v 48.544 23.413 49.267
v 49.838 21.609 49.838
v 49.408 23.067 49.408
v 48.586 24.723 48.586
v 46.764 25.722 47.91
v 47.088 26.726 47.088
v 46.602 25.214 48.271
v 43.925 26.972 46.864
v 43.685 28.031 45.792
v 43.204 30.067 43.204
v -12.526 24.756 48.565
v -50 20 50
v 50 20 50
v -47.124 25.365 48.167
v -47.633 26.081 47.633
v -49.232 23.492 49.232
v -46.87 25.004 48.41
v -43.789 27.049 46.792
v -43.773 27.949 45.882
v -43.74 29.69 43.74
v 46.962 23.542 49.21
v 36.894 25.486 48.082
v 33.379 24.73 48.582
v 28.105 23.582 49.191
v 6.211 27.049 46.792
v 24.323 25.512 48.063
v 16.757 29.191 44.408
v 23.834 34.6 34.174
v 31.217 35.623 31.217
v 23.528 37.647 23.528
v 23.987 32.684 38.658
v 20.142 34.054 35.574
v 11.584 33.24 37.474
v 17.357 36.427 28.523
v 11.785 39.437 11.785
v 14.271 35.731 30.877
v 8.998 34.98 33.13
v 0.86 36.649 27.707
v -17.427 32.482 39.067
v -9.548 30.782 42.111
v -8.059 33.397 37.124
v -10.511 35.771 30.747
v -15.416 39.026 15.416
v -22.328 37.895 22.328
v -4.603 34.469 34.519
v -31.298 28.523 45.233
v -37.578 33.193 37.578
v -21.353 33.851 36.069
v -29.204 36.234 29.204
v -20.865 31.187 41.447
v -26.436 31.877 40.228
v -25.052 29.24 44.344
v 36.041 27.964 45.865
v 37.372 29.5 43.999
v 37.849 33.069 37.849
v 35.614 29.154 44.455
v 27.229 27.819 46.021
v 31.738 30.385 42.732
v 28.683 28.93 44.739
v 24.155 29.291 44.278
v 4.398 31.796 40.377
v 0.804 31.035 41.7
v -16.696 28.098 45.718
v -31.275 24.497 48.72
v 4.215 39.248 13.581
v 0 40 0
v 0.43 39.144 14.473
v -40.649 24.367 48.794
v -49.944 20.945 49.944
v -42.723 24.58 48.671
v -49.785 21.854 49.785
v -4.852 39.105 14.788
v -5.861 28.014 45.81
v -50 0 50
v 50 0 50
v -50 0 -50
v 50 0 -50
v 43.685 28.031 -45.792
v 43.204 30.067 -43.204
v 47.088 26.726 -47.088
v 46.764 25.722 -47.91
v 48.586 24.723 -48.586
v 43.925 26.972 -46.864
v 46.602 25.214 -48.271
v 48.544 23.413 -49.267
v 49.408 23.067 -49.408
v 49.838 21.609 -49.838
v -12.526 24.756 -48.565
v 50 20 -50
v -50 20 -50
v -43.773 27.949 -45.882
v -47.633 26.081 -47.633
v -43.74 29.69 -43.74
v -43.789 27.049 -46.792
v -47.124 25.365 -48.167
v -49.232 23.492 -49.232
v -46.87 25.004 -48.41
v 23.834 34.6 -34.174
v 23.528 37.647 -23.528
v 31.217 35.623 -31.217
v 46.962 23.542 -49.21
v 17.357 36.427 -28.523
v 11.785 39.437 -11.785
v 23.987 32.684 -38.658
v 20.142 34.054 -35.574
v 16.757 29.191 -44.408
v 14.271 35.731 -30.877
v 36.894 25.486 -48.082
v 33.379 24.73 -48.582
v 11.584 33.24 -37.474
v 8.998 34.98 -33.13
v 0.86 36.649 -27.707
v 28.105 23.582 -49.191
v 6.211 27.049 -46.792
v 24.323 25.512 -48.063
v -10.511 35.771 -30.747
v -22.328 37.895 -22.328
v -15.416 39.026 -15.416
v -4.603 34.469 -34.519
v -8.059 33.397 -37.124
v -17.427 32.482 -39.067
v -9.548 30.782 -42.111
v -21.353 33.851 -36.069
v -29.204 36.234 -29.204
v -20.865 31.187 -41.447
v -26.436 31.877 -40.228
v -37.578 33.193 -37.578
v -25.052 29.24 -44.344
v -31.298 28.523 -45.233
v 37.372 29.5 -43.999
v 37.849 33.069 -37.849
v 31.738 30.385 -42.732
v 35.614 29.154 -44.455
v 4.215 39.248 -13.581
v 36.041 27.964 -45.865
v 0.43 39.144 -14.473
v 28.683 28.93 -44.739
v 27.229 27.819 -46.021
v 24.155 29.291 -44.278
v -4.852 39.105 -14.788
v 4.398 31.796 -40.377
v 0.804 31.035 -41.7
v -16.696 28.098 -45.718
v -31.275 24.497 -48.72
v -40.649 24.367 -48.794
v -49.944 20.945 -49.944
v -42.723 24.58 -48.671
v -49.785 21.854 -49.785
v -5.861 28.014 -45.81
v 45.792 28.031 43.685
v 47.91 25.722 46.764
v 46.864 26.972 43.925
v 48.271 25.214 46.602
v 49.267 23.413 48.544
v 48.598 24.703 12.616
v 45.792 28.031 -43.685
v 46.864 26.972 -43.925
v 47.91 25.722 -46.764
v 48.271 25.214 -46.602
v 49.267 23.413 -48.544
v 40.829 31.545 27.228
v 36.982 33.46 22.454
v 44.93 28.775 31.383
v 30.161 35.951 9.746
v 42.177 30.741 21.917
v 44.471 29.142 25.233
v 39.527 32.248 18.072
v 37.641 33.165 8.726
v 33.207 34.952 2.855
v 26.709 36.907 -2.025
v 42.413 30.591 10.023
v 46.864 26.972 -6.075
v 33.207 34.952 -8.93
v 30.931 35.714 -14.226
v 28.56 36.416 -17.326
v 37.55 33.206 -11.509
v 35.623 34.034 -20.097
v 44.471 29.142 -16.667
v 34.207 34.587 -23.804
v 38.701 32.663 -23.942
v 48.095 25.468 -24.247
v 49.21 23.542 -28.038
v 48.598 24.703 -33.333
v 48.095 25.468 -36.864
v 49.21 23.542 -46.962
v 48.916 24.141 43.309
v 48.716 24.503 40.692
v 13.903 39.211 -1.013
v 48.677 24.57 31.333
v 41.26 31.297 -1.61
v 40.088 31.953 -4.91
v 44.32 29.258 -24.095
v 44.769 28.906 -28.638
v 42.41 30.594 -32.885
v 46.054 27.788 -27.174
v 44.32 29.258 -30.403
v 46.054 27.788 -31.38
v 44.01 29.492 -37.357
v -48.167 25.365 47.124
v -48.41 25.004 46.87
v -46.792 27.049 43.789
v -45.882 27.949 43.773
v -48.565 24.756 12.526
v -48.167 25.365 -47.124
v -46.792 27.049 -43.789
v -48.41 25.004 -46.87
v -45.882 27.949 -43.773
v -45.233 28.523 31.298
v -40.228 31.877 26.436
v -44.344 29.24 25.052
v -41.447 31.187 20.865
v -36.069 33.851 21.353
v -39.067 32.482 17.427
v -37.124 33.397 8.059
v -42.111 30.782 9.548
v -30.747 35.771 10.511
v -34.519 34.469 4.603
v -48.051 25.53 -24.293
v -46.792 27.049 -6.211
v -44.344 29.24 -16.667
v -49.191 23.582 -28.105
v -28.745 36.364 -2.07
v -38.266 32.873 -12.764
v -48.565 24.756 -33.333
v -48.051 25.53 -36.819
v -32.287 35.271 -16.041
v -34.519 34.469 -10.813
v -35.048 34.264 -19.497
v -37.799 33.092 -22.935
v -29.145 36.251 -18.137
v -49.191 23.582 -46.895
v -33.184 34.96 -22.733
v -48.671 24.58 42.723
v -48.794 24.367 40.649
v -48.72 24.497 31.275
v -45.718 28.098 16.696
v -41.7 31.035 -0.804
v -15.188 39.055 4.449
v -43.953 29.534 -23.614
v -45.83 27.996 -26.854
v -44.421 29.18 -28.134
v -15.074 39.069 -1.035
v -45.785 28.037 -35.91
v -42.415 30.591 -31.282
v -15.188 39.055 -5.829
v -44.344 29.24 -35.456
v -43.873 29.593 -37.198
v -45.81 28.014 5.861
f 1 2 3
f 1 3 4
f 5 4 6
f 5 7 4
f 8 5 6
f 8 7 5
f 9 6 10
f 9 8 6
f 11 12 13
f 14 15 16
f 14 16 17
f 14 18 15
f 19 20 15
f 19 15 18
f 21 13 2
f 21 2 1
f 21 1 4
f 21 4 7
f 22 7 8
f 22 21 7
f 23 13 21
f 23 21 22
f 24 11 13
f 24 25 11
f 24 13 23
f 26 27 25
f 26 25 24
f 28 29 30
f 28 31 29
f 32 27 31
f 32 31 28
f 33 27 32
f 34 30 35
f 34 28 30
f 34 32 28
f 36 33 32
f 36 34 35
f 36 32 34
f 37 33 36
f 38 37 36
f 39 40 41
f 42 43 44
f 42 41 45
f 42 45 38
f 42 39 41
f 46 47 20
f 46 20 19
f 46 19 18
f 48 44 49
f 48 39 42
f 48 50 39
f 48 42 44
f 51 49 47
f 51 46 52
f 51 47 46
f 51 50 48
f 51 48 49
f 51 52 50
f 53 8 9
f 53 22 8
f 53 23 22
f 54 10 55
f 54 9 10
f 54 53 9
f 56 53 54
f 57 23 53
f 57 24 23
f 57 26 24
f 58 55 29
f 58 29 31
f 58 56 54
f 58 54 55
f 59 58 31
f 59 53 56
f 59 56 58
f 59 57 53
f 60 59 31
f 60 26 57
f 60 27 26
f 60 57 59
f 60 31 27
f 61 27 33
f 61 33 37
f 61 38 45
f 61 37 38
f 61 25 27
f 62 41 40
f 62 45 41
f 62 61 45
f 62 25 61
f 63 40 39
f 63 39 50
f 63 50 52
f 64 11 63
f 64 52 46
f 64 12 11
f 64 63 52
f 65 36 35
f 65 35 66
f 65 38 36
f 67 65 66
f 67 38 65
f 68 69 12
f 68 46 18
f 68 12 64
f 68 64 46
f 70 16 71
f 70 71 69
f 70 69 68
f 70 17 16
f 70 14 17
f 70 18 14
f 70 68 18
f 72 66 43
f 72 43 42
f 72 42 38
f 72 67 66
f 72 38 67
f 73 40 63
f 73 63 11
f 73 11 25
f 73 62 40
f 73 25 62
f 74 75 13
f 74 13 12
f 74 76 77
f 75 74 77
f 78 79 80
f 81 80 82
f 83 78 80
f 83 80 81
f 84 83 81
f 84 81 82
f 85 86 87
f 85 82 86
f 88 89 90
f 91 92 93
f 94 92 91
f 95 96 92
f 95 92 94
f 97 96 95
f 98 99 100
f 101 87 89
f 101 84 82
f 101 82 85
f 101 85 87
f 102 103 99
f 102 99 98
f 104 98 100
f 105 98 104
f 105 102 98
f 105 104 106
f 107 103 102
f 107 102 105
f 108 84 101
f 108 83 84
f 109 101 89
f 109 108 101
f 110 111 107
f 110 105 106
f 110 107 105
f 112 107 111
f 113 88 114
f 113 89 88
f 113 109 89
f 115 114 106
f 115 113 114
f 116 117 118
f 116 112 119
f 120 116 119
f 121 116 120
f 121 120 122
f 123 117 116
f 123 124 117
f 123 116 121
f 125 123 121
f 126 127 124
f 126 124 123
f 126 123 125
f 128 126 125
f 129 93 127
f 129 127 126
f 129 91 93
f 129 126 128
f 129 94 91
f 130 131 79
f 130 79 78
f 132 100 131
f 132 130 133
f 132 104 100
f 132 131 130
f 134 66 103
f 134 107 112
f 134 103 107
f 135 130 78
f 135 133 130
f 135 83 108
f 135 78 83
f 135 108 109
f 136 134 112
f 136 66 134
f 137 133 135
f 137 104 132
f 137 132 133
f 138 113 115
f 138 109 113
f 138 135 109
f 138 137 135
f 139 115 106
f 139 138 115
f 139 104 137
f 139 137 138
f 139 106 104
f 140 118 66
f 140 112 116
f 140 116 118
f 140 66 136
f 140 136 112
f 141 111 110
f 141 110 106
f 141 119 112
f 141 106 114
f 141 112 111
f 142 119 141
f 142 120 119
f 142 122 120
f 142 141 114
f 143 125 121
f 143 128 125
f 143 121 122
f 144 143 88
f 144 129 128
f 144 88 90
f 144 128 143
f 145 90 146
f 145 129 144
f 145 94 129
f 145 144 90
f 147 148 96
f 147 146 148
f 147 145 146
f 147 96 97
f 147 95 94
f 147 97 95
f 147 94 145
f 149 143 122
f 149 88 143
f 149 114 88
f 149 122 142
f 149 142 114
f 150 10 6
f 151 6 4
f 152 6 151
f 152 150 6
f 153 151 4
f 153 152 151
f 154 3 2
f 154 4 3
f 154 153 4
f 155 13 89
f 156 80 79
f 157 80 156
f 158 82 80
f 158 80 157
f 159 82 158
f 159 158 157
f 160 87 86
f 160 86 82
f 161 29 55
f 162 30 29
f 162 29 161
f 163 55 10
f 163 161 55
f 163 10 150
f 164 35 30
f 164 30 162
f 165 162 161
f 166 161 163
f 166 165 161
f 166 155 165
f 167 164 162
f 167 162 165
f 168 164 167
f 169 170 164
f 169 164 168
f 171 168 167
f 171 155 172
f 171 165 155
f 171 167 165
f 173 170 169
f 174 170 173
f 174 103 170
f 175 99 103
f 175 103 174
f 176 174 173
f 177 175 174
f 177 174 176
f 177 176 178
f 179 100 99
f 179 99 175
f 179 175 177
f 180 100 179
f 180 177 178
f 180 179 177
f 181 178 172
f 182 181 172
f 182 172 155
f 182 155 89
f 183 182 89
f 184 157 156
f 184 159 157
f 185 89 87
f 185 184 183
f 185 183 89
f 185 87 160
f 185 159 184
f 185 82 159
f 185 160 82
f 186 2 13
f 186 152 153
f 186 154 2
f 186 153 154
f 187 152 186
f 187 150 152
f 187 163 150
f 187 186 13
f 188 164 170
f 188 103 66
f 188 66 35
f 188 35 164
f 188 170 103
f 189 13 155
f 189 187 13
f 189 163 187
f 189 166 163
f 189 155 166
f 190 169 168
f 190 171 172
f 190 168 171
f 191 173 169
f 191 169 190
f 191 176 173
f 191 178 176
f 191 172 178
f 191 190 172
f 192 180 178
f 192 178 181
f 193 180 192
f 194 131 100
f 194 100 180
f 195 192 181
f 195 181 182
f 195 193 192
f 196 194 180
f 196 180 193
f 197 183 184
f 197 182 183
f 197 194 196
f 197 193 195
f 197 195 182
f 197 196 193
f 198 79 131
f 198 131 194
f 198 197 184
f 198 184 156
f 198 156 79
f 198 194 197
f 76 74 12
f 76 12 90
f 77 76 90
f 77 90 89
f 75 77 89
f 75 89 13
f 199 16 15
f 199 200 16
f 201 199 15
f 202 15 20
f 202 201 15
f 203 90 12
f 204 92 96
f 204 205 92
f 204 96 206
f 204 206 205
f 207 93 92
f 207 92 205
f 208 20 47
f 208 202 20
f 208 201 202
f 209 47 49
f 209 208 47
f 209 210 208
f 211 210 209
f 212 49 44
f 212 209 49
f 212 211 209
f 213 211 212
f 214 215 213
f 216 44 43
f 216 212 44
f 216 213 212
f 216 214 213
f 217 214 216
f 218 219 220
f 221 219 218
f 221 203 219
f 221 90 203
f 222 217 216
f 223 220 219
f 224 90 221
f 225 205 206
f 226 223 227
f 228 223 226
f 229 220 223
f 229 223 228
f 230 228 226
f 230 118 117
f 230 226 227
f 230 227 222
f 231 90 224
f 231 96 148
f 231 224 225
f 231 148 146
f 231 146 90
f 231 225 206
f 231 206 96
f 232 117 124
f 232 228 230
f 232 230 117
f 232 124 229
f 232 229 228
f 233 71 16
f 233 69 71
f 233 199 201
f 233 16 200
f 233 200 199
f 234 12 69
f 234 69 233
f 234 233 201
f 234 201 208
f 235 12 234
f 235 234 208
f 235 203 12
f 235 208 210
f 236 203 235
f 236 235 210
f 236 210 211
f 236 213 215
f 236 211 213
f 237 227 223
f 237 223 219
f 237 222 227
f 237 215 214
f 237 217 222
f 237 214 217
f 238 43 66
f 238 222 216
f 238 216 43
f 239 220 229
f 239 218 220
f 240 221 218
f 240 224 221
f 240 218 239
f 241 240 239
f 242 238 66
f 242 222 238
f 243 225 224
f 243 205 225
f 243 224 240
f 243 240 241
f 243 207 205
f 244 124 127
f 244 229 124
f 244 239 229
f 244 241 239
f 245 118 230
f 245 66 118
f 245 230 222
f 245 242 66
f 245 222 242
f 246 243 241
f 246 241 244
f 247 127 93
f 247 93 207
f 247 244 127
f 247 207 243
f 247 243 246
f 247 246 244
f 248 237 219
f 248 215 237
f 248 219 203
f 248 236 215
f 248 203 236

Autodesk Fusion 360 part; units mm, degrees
sketch "Sketch1" plane through (0, 0, 0) normal (0, 1, 0) x (1, 0, 0)
  line L0 (50, -50) -> (-50, -50)
  line L1 (-50, -50) -> (-50, 50)
  line L2 (-50, 50) -> (50, 50)
  line L3 (50, 50) -> (50, -50)
  line L4 (50, -50) -> (-50, 50) construction
  line L5 (-50, -50) -> (50, 50) construction
  dimension "d1" = 100
  dimension "d2" = 100
extrude "Extrude1" add sketch "Sketch1" along normal blind 20 makes body 1
sketch "Sketch2" plane through (0, 0, -50) normal (0, 0, -1) x (-1, 0, 0)
  line L0 (-50, 0) -> (50, 0)
  line L1 (50, 0) -> (50, 20)
  line L2 (50, 20) -> (-50, 20)
  line L3 (-50, 20) -> (-50, 0)
  ellipse E0 centre (0, 20) end of major axis (50, 20) minor radius 20
  line L4 (-50, 20) -> (50, 20)
  line L5 (0, 0) -> (0, 40)
  dimension "d5" = 40
extrude "Extrude2" add sketch "Sketch2" against normal blind 100 separate body contours L2 E0 L4 L5 | L2 E0 L4 L5 picked at (-29.3498, 24.3251) picked at (27.8267, 24.9515) makes body 2
sketch "Sketch3" plane through (-50, 0, 0) normal (-1, 0, 0) x (0, 0, 1)
  line L0 (-50, 0) -> (50, 0)
  line L1 (50, 0) -> (50, 20)
  line L2 (50, 20) -> (-50, 20)
  line L3 (-50, 20) -> (-50, 0)
  ellipse E0 centre (0, 20) end of major axis (50, 20) minor radius 20
  line L4 (-50, 20) -> (50, 20)
  line L5 (0, 0) -> (0, 40)
  dimension "d8" = 40
extrude "Extrude3" add sketch "Sketch3" against normal blind 100 separate body contours L2 E0 L4 L5 | L2 E0 L4 L5 picked at (-29.3498, 24.3251) picked at (27.8267, 24.9515) makes body 3
sketch "Sketch4" plane through (0, 0, 0) normal (0, -1, 0) x (1, 0, 0)
  line L0 (-50, -50) -> (50, -50)
  line L1 (50, -50) -> (50, 50)
  line L2 (50, 50) -> (-50, 50)
  line L3 (-50, 50) -> (-50, -50)
  line L4 (50, 50) -> (-50, -50)
  line L5 (-50, 50) -> (50, -50)
extrude "Extrude4" cut sketch "Sketch4" along normal blind -20 and the other way blind 40 contours L0 L4 L5 | L2 L4 L5 bodies 2
extrude "Extrude5" cut sketch "Sketch4" along normal blind -20 and the other way blind 40 contours L3 L4 L5 | L1 L4 L5 bodies 3
combine "Combine1" operation add target body 1 tool bodies 2 3
